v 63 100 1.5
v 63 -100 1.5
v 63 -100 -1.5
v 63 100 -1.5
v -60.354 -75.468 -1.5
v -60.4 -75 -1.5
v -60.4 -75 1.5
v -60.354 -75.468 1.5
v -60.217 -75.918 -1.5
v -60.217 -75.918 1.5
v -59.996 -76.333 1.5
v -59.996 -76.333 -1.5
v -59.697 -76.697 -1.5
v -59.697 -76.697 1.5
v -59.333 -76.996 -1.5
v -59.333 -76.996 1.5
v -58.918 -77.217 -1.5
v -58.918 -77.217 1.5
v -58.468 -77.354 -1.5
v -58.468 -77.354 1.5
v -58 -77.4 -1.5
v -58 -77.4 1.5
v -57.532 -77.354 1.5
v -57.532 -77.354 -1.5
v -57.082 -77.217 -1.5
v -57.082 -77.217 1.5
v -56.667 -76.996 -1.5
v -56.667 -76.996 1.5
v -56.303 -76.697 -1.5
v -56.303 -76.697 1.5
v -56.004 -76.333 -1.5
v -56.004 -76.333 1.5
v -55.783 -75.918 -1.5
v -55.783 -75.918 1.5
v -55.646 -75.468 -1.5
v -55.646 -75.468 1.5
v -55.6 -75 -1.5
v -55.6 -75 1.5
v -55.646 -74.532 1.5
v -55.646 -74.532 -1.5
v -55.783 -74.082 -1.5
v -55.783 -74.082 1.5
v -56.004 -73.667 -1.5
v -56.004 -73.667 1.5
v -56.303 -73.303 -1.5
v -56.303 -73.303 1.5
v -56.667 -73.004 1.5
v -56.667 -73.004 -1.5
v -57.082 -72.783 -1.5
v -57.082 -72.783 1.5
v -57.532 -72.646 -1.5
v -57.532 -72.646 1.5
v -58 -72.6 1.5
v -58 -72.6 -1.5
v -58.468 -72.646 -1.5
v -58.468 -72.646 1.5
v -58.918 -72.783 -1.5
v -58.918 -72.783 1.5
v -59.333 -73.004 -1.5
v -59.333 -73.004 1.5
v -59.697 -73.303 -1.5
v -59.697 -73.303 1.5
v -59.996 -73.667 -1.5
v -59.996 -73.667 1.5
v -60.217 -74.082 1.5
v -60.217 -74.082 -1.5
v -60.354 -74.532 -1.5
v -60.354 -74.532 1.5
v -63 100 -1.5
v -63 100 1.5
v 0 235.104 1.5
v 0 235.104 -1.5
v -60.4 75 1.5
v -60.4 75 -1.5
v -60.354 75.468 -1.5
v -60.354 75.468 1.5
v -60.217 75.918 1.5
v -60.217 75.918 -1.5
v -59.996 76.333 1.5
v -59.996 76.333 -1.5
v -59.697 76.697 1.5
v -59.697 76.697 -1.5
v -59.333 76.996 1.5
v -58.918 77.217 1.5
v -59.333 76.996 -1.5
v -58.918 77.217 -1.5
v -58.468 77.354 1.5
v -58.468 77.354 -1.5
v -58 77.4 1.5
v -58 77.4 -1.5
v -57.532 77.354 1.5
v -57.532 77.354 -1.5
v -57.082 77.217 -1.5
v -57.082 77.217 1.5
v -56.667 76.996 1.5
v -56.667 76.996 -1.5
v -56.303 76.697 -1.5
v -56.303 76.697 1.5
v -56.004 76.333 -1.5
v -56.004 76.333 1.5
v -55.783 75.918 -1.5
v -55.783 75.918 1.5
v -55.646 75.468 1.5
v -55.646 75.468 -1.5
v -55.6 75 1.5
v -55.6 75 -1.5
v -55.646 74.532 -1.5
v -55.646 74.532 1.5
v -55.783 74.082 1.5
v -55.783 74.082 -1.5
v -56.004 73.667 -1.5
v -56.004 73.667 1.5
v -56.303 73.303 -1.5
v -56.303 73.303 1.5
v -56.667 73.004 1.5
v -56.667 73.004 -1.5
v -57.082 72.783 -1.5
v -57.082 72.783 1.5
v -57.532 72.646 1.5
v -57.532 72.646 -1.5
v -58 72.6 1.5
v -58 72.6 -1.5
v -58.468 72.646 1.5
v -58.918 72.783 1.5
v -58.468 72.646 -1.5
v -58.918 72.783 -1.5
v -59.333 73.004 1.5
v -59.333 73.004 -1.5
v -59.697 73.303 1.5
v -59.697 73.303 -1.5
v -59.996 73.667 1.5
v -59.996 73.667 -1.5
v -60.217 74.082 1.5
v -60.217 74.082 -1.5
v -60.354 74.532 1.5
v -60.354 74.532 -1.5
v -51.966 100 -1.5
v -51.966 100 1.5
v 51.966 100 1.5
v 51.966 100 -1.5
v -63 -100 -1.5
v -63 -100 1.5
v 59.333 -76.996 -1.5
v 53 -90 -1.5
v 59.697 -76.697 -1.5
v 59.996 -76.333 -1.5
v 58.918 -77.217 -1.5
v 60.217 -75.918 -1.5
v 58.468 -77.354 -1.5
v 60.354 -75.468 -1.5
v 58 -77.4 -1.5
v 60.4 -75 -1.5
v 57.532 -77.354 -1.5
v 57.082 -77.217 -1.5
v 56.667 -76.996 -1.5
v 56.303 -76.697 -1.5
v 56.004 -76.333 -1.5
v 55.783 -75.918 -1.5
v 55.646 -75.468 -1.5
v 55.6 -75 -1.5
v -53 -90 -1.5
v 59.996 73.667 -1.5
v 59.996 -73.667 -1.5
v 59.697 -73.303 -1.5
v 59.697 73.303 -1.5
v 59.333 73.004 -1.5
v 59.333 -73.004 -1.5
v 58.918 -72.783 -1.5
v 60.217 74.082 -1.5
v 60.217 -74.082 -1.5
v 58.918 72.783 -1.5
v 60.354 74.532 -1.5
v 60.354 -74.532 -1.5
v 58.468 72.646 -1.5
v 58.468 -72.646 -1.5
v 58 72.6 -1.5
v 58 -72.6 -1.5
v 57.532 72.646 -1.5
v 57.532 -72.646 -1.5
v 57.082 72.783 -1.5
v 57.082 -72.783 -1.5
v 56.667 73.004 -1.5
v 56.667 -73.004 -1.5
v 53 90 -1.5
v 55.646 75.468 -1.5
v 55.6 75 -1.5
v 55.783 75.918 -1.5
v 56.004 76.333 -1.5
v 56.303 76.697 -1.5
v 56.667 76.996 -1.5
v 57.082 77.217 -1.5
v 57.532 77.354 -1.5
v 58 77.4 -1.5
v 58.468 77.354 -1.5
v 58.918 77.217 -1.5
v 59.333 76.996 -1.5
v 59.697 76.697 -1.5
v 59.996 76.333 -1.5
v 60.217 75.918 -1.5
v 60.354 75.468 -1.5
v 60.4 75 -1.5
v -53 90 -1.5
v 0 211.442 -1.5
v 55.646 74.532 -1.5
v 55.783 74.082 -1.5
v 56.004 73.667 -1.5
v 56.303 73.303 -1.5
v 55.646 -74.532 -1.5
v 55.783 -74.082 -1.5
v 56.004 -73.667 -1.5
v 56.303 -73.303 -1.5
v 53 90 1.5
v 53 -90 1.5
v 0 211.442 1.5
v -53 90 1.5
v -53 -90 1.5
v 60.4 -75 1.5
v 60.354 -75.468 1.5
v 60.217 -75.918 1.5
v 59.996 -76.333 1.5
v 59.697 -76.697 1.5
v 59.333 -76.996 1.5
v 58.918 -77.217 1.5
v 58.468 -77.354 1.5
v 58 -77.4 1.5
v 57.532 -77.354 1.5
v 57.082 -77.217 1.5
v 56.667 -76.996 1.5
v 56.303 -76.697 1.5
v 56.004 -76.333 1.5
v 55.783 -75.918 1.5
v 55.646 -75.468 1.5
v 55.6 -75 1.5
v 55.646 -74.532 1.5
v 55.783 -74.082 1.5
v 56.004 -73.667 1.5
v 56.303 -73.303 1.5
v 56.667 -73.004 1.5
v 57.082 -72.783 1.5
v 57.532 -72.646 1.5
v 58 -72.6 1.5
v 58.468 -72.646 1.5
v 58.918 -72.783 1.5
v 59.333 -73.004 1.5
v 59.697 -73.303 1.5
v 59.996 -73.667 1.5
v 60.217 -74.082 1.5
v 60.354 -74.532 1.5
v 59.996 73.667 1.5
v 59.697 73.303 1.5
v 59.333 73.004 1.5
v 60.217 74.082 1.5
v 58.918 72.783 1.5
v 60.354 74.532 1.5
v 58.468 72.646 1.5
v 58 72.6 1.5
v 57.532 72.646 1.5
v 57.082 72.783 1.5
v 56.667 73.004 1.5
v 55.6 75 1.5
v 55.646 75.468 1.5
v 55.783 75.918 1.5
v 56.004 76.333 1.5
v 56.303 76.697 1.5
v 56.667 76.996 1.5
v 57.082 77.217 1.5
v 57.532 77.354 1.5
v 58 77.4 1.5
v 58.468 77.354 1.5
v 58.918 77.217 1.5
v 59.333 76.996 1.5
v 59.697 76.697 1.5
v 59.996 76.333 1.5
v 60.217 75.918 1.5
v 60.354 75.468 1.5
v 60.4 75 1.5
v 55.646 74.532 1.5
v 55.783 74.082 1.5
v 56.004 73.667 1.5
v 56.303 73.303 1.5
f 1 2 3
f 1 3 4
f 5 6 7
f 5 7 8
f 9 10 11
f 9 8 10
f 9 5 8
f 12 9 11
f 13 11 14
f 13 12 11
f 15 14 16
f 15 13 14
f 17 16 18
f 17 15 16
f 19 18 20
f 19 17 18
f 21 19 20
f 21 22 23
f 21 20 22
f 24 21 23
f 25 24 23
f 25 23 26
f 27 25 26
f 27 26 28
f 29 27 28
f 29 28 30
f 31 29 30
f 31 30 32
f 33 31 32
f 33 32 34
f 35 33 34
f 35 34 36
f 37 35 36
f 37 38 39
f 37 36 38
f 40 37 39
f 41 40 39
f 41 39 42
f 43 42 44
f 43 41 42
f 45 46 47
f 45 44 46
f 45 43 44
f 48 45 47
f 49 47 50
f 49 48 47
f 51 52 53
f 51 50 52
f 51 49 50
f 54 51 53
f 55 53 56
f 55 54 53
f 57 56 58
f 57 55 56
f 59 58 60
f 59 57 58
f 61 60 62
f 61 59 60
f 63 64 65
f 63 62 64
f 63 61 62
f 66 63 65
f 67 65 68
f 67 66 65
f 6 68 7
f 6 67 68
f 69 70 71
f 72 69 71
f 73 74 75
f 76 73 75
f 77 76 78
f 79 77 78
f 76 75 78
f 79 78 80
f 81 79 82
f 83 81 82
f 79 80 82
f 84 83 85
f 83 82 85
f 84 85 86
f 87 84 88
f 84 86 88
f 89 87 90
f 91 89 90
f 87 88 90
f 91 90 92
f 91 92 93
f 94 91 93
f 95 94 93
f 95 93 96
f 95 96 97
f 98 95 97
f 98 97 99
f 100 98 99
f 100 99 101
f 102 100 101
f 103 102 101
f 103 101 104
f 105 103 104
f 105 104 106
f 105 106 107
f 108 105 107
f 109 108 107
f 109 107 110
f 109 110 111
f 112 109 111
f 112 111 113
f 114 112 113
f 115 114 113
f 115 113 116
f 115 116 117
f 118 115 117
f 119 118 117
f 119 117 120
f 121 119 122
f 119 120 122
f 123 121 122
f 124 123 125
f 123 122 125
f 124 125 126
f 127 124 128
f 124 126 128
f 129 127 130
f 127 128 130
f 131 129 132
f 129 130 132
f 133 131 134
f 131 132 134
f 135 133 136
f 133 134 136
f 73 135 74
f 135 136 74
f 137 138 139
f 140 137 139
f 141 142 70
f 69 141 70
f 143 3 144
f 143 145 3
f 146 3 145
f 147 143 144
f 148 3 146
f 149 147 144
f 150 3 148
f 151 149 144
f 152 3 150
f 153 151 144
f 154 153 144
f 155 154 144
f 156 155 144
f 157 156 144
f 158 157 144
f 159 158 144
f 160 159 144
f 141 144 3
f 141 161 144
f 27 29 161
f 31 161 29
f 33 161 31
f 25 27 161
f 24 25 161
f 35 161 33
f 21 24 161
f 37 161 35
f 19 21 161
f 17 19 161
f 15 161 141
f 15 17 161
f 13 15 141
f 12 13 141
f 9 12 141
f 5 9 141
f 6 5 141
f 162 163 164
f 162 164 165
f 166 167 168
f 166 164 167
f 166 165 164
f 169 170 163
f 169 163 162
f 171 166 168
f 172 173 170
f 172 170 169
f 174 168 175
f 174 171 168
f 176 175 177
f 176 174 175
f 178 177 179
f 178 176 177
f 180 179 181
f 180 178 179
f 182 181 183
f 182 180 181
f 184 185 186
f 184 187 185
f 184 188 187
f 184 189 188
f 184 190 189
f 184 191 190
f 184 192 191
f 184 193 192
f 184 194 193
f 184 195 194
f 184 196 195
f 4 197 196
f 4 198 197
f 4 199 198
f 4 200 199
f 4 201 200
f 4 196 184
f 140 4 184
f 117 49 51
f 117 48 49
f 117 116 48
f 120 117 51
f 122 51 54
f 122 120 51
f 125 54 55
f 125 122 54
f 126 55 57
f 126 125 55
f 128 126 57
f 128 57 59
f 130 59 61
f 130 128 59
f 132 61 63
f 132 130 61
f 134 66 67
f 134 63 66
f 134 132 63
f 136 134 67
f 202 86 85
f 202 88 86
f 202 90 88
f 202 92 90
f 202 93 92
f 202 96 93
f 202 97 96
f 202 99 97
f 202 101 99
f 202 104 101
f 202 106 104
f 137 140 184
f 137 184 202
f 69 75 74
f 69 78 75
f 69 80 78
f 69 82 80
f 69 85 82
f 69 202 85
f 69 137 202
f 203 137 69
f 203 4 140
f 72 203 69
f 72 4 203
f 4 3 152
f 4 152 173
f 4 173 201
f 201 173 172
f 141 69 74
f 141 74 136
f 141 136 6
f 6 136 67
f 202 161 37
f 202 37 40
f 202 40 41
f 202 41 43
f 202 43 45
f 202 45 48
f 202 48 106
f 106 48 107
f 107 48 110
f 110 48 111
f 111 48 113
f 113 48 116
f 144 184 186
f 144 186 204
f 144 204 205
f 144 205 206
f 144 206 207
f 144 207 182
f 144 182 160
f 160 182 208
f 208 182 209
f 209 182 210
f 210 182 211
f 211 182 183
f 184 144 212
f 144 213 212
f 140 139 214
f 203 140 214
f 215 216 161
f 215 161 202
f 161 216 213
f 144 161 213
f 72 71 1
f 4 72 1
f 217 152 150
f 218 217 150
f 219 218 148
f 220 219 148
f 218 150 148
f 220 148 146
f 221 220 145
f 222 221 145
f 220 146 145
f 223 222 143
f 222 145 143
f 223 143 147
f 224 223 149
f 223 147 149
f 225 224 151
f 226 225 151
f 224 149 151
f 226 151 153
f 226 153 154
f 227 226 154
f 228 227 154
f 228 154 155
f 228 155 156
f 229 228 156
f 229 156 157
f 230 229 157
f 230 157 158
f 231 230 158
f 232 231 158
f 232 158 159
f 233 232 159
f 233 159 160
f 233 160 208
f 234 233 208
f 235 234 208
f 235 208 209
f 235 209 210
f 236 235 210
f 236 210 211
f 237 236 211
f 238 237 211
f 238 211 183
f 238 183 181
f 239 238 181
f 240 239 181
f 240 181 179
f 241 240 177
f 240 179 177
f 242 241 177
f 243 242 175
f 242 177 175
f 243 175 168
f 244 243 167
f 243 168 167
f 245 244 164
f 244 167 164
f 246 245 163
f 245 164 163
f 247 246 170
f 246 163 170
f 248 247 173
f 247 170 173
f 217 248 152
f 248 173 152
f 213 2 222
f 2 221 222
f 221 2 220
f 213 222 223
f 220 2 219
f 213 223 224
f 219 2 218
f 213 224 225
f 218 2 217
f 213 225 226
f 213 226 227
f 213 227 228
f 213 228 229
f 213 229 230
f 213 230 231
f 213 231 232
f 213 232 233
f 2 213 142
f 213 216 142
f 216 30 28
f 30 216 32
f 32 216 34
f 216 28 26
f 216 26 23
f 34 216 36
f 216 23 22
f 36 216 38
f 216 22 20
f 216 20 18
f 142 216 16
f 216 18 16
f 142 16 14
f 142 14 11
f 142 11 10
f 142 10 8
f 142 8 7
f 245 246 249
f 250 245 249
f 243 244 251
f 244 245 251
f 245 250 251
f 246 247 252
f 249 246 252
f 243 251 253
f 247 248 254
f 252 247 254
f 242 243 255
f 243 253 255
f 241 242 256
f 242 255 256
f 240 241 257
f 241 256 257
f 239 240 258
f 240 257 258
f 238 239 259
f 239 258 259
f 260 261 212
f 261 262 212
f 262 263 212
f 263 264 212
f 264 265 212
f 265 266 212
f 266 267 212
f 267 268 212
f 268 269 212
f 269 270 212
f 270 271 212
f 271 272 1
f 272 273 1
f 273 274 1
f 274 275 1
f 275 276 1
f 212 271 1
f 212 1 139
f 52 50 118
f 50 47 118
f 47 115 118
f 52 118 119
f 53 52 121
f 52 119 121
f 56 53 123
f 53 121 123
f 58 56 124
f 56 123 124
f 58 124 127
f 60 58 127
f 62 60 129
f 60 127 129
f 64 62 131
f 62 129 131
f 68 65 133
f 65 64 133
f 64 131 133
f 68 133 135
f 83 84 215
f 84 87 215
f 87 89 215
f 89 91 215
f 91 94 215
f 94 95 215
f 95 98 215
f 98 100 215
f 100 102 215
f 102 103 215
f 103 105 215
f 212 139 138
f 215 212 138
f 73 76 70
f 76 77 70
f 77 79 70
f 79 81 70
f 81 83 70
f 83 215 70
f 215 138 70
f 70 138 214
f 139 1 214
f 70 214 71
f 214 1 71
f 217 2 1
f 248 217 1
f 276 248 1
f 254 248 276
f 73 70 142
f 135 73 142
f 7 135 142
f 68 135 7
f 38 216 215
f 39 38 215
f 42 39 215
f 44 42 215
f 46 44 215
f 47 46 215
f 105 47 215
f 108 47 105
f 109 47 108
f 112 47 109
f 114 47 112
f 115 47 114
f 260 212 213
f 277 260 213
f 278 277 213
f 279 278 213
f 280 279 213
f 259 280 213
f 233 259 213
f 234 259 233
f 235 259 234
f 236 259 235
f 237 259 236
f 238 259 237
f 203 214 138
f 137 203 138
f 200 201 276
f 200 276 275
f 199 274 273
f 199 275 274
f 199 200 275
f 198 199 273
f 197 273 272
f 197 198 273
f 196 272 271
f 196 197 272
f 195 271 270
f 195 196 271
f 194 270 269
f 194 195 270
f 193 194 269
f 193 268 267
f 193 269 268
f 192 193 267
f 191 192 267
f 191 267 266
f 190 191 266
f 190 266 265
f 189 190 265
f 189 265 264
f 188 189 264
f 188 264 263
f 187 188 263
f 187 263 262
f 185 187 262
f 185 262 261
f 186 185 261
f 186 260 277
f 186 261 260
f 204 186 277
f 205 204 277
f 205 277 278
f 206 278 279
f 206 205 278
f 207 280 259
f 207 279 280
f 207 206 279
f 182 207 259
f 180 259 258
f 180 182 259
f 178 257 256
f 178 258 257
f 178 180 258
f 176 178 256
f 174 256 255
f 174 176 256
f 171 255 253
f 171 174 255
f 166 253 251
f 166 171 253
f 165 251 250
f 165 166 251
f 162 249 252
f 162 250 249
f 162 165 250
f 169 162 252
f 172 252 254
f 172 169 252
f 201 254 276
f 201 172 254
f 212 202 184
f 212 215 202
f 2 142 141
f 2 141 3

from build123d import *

# Parameters (mm, degrees)
SKETCH1_W                            = 126
SKETCH1_H                            = 200
SKETCH1_W_2                          = 106
SKETCH1_H_2                          = 180
RECTANGLE_RIB_DEPTH                  = 1.5
TRIANGLE_RIB_DEPTH                   = 3
M4_CLEARANCE_HOLE1_D                 = 4.8
MIRROR1_AT_THE_SECOND_PLANE_COPY_1_D = 4.8


with BuildPart() as part:
    # Sketch1 → Rectangle Rib (new, symmetric)
    with BuildSketch(Plane.XY):
        Rectangle(SKETCH1_W, SKETCH1_H)
        Rectangle(SKETCH1_W_2, SKETCH1_H_2, mode=Mode.SUBTRACT)
    extrude(amount=RECTANGLE_RIB_DEPTH, both=True)

    # Sketch2 → Triangle Rib (add)
    with BuildSketch(Plane.XY.offset(1.5)):
        Polygon((-63, 100), (0, 235.103935992), (63, 100), (51.96622081, 100), (0, 211.441920161), (-51.96622081, 100), align=None)
    extrude(amount=-TRIANGLE_RIB_DEPTH)

    # M4 Clearance Hole1 (through all)
    with Locations(Plane.XY.offset(1.5)):
        with Locations((-58, 75)):
            m4_clearance_hole1 = Hole(M4_CLEARANCE_HOLE1_D / 2)

    # Mirror1: M4 Clearance Hole1 across plane
    add(m4_clearance_hole1.mirror(Plane.ZX), mode=Mode.SUBTRACT)

    # Mirror1 at the second plane: M4 Clearance Hole1 across plane
    add(m4_clearance_hole1.mirror(Plane(origin=(0, 0, 0), x_dir=(0, 0, 1), z_dir=(1, 0, 0))), mode=Mode.SUBTRACT)

    # Mirror1 at the second plane copy 1 (through all)
    with Locations(Plane(origin=(0, 0, 1.5), x_dir=(-1, 0, 0), z_dir=(0, 0, 1))):
        with Locations((-58, 75)):
            Hole(MIRROR1_AT_THE_SECOND_PLANE_COPY_1_D / 2)


solid = part.part
